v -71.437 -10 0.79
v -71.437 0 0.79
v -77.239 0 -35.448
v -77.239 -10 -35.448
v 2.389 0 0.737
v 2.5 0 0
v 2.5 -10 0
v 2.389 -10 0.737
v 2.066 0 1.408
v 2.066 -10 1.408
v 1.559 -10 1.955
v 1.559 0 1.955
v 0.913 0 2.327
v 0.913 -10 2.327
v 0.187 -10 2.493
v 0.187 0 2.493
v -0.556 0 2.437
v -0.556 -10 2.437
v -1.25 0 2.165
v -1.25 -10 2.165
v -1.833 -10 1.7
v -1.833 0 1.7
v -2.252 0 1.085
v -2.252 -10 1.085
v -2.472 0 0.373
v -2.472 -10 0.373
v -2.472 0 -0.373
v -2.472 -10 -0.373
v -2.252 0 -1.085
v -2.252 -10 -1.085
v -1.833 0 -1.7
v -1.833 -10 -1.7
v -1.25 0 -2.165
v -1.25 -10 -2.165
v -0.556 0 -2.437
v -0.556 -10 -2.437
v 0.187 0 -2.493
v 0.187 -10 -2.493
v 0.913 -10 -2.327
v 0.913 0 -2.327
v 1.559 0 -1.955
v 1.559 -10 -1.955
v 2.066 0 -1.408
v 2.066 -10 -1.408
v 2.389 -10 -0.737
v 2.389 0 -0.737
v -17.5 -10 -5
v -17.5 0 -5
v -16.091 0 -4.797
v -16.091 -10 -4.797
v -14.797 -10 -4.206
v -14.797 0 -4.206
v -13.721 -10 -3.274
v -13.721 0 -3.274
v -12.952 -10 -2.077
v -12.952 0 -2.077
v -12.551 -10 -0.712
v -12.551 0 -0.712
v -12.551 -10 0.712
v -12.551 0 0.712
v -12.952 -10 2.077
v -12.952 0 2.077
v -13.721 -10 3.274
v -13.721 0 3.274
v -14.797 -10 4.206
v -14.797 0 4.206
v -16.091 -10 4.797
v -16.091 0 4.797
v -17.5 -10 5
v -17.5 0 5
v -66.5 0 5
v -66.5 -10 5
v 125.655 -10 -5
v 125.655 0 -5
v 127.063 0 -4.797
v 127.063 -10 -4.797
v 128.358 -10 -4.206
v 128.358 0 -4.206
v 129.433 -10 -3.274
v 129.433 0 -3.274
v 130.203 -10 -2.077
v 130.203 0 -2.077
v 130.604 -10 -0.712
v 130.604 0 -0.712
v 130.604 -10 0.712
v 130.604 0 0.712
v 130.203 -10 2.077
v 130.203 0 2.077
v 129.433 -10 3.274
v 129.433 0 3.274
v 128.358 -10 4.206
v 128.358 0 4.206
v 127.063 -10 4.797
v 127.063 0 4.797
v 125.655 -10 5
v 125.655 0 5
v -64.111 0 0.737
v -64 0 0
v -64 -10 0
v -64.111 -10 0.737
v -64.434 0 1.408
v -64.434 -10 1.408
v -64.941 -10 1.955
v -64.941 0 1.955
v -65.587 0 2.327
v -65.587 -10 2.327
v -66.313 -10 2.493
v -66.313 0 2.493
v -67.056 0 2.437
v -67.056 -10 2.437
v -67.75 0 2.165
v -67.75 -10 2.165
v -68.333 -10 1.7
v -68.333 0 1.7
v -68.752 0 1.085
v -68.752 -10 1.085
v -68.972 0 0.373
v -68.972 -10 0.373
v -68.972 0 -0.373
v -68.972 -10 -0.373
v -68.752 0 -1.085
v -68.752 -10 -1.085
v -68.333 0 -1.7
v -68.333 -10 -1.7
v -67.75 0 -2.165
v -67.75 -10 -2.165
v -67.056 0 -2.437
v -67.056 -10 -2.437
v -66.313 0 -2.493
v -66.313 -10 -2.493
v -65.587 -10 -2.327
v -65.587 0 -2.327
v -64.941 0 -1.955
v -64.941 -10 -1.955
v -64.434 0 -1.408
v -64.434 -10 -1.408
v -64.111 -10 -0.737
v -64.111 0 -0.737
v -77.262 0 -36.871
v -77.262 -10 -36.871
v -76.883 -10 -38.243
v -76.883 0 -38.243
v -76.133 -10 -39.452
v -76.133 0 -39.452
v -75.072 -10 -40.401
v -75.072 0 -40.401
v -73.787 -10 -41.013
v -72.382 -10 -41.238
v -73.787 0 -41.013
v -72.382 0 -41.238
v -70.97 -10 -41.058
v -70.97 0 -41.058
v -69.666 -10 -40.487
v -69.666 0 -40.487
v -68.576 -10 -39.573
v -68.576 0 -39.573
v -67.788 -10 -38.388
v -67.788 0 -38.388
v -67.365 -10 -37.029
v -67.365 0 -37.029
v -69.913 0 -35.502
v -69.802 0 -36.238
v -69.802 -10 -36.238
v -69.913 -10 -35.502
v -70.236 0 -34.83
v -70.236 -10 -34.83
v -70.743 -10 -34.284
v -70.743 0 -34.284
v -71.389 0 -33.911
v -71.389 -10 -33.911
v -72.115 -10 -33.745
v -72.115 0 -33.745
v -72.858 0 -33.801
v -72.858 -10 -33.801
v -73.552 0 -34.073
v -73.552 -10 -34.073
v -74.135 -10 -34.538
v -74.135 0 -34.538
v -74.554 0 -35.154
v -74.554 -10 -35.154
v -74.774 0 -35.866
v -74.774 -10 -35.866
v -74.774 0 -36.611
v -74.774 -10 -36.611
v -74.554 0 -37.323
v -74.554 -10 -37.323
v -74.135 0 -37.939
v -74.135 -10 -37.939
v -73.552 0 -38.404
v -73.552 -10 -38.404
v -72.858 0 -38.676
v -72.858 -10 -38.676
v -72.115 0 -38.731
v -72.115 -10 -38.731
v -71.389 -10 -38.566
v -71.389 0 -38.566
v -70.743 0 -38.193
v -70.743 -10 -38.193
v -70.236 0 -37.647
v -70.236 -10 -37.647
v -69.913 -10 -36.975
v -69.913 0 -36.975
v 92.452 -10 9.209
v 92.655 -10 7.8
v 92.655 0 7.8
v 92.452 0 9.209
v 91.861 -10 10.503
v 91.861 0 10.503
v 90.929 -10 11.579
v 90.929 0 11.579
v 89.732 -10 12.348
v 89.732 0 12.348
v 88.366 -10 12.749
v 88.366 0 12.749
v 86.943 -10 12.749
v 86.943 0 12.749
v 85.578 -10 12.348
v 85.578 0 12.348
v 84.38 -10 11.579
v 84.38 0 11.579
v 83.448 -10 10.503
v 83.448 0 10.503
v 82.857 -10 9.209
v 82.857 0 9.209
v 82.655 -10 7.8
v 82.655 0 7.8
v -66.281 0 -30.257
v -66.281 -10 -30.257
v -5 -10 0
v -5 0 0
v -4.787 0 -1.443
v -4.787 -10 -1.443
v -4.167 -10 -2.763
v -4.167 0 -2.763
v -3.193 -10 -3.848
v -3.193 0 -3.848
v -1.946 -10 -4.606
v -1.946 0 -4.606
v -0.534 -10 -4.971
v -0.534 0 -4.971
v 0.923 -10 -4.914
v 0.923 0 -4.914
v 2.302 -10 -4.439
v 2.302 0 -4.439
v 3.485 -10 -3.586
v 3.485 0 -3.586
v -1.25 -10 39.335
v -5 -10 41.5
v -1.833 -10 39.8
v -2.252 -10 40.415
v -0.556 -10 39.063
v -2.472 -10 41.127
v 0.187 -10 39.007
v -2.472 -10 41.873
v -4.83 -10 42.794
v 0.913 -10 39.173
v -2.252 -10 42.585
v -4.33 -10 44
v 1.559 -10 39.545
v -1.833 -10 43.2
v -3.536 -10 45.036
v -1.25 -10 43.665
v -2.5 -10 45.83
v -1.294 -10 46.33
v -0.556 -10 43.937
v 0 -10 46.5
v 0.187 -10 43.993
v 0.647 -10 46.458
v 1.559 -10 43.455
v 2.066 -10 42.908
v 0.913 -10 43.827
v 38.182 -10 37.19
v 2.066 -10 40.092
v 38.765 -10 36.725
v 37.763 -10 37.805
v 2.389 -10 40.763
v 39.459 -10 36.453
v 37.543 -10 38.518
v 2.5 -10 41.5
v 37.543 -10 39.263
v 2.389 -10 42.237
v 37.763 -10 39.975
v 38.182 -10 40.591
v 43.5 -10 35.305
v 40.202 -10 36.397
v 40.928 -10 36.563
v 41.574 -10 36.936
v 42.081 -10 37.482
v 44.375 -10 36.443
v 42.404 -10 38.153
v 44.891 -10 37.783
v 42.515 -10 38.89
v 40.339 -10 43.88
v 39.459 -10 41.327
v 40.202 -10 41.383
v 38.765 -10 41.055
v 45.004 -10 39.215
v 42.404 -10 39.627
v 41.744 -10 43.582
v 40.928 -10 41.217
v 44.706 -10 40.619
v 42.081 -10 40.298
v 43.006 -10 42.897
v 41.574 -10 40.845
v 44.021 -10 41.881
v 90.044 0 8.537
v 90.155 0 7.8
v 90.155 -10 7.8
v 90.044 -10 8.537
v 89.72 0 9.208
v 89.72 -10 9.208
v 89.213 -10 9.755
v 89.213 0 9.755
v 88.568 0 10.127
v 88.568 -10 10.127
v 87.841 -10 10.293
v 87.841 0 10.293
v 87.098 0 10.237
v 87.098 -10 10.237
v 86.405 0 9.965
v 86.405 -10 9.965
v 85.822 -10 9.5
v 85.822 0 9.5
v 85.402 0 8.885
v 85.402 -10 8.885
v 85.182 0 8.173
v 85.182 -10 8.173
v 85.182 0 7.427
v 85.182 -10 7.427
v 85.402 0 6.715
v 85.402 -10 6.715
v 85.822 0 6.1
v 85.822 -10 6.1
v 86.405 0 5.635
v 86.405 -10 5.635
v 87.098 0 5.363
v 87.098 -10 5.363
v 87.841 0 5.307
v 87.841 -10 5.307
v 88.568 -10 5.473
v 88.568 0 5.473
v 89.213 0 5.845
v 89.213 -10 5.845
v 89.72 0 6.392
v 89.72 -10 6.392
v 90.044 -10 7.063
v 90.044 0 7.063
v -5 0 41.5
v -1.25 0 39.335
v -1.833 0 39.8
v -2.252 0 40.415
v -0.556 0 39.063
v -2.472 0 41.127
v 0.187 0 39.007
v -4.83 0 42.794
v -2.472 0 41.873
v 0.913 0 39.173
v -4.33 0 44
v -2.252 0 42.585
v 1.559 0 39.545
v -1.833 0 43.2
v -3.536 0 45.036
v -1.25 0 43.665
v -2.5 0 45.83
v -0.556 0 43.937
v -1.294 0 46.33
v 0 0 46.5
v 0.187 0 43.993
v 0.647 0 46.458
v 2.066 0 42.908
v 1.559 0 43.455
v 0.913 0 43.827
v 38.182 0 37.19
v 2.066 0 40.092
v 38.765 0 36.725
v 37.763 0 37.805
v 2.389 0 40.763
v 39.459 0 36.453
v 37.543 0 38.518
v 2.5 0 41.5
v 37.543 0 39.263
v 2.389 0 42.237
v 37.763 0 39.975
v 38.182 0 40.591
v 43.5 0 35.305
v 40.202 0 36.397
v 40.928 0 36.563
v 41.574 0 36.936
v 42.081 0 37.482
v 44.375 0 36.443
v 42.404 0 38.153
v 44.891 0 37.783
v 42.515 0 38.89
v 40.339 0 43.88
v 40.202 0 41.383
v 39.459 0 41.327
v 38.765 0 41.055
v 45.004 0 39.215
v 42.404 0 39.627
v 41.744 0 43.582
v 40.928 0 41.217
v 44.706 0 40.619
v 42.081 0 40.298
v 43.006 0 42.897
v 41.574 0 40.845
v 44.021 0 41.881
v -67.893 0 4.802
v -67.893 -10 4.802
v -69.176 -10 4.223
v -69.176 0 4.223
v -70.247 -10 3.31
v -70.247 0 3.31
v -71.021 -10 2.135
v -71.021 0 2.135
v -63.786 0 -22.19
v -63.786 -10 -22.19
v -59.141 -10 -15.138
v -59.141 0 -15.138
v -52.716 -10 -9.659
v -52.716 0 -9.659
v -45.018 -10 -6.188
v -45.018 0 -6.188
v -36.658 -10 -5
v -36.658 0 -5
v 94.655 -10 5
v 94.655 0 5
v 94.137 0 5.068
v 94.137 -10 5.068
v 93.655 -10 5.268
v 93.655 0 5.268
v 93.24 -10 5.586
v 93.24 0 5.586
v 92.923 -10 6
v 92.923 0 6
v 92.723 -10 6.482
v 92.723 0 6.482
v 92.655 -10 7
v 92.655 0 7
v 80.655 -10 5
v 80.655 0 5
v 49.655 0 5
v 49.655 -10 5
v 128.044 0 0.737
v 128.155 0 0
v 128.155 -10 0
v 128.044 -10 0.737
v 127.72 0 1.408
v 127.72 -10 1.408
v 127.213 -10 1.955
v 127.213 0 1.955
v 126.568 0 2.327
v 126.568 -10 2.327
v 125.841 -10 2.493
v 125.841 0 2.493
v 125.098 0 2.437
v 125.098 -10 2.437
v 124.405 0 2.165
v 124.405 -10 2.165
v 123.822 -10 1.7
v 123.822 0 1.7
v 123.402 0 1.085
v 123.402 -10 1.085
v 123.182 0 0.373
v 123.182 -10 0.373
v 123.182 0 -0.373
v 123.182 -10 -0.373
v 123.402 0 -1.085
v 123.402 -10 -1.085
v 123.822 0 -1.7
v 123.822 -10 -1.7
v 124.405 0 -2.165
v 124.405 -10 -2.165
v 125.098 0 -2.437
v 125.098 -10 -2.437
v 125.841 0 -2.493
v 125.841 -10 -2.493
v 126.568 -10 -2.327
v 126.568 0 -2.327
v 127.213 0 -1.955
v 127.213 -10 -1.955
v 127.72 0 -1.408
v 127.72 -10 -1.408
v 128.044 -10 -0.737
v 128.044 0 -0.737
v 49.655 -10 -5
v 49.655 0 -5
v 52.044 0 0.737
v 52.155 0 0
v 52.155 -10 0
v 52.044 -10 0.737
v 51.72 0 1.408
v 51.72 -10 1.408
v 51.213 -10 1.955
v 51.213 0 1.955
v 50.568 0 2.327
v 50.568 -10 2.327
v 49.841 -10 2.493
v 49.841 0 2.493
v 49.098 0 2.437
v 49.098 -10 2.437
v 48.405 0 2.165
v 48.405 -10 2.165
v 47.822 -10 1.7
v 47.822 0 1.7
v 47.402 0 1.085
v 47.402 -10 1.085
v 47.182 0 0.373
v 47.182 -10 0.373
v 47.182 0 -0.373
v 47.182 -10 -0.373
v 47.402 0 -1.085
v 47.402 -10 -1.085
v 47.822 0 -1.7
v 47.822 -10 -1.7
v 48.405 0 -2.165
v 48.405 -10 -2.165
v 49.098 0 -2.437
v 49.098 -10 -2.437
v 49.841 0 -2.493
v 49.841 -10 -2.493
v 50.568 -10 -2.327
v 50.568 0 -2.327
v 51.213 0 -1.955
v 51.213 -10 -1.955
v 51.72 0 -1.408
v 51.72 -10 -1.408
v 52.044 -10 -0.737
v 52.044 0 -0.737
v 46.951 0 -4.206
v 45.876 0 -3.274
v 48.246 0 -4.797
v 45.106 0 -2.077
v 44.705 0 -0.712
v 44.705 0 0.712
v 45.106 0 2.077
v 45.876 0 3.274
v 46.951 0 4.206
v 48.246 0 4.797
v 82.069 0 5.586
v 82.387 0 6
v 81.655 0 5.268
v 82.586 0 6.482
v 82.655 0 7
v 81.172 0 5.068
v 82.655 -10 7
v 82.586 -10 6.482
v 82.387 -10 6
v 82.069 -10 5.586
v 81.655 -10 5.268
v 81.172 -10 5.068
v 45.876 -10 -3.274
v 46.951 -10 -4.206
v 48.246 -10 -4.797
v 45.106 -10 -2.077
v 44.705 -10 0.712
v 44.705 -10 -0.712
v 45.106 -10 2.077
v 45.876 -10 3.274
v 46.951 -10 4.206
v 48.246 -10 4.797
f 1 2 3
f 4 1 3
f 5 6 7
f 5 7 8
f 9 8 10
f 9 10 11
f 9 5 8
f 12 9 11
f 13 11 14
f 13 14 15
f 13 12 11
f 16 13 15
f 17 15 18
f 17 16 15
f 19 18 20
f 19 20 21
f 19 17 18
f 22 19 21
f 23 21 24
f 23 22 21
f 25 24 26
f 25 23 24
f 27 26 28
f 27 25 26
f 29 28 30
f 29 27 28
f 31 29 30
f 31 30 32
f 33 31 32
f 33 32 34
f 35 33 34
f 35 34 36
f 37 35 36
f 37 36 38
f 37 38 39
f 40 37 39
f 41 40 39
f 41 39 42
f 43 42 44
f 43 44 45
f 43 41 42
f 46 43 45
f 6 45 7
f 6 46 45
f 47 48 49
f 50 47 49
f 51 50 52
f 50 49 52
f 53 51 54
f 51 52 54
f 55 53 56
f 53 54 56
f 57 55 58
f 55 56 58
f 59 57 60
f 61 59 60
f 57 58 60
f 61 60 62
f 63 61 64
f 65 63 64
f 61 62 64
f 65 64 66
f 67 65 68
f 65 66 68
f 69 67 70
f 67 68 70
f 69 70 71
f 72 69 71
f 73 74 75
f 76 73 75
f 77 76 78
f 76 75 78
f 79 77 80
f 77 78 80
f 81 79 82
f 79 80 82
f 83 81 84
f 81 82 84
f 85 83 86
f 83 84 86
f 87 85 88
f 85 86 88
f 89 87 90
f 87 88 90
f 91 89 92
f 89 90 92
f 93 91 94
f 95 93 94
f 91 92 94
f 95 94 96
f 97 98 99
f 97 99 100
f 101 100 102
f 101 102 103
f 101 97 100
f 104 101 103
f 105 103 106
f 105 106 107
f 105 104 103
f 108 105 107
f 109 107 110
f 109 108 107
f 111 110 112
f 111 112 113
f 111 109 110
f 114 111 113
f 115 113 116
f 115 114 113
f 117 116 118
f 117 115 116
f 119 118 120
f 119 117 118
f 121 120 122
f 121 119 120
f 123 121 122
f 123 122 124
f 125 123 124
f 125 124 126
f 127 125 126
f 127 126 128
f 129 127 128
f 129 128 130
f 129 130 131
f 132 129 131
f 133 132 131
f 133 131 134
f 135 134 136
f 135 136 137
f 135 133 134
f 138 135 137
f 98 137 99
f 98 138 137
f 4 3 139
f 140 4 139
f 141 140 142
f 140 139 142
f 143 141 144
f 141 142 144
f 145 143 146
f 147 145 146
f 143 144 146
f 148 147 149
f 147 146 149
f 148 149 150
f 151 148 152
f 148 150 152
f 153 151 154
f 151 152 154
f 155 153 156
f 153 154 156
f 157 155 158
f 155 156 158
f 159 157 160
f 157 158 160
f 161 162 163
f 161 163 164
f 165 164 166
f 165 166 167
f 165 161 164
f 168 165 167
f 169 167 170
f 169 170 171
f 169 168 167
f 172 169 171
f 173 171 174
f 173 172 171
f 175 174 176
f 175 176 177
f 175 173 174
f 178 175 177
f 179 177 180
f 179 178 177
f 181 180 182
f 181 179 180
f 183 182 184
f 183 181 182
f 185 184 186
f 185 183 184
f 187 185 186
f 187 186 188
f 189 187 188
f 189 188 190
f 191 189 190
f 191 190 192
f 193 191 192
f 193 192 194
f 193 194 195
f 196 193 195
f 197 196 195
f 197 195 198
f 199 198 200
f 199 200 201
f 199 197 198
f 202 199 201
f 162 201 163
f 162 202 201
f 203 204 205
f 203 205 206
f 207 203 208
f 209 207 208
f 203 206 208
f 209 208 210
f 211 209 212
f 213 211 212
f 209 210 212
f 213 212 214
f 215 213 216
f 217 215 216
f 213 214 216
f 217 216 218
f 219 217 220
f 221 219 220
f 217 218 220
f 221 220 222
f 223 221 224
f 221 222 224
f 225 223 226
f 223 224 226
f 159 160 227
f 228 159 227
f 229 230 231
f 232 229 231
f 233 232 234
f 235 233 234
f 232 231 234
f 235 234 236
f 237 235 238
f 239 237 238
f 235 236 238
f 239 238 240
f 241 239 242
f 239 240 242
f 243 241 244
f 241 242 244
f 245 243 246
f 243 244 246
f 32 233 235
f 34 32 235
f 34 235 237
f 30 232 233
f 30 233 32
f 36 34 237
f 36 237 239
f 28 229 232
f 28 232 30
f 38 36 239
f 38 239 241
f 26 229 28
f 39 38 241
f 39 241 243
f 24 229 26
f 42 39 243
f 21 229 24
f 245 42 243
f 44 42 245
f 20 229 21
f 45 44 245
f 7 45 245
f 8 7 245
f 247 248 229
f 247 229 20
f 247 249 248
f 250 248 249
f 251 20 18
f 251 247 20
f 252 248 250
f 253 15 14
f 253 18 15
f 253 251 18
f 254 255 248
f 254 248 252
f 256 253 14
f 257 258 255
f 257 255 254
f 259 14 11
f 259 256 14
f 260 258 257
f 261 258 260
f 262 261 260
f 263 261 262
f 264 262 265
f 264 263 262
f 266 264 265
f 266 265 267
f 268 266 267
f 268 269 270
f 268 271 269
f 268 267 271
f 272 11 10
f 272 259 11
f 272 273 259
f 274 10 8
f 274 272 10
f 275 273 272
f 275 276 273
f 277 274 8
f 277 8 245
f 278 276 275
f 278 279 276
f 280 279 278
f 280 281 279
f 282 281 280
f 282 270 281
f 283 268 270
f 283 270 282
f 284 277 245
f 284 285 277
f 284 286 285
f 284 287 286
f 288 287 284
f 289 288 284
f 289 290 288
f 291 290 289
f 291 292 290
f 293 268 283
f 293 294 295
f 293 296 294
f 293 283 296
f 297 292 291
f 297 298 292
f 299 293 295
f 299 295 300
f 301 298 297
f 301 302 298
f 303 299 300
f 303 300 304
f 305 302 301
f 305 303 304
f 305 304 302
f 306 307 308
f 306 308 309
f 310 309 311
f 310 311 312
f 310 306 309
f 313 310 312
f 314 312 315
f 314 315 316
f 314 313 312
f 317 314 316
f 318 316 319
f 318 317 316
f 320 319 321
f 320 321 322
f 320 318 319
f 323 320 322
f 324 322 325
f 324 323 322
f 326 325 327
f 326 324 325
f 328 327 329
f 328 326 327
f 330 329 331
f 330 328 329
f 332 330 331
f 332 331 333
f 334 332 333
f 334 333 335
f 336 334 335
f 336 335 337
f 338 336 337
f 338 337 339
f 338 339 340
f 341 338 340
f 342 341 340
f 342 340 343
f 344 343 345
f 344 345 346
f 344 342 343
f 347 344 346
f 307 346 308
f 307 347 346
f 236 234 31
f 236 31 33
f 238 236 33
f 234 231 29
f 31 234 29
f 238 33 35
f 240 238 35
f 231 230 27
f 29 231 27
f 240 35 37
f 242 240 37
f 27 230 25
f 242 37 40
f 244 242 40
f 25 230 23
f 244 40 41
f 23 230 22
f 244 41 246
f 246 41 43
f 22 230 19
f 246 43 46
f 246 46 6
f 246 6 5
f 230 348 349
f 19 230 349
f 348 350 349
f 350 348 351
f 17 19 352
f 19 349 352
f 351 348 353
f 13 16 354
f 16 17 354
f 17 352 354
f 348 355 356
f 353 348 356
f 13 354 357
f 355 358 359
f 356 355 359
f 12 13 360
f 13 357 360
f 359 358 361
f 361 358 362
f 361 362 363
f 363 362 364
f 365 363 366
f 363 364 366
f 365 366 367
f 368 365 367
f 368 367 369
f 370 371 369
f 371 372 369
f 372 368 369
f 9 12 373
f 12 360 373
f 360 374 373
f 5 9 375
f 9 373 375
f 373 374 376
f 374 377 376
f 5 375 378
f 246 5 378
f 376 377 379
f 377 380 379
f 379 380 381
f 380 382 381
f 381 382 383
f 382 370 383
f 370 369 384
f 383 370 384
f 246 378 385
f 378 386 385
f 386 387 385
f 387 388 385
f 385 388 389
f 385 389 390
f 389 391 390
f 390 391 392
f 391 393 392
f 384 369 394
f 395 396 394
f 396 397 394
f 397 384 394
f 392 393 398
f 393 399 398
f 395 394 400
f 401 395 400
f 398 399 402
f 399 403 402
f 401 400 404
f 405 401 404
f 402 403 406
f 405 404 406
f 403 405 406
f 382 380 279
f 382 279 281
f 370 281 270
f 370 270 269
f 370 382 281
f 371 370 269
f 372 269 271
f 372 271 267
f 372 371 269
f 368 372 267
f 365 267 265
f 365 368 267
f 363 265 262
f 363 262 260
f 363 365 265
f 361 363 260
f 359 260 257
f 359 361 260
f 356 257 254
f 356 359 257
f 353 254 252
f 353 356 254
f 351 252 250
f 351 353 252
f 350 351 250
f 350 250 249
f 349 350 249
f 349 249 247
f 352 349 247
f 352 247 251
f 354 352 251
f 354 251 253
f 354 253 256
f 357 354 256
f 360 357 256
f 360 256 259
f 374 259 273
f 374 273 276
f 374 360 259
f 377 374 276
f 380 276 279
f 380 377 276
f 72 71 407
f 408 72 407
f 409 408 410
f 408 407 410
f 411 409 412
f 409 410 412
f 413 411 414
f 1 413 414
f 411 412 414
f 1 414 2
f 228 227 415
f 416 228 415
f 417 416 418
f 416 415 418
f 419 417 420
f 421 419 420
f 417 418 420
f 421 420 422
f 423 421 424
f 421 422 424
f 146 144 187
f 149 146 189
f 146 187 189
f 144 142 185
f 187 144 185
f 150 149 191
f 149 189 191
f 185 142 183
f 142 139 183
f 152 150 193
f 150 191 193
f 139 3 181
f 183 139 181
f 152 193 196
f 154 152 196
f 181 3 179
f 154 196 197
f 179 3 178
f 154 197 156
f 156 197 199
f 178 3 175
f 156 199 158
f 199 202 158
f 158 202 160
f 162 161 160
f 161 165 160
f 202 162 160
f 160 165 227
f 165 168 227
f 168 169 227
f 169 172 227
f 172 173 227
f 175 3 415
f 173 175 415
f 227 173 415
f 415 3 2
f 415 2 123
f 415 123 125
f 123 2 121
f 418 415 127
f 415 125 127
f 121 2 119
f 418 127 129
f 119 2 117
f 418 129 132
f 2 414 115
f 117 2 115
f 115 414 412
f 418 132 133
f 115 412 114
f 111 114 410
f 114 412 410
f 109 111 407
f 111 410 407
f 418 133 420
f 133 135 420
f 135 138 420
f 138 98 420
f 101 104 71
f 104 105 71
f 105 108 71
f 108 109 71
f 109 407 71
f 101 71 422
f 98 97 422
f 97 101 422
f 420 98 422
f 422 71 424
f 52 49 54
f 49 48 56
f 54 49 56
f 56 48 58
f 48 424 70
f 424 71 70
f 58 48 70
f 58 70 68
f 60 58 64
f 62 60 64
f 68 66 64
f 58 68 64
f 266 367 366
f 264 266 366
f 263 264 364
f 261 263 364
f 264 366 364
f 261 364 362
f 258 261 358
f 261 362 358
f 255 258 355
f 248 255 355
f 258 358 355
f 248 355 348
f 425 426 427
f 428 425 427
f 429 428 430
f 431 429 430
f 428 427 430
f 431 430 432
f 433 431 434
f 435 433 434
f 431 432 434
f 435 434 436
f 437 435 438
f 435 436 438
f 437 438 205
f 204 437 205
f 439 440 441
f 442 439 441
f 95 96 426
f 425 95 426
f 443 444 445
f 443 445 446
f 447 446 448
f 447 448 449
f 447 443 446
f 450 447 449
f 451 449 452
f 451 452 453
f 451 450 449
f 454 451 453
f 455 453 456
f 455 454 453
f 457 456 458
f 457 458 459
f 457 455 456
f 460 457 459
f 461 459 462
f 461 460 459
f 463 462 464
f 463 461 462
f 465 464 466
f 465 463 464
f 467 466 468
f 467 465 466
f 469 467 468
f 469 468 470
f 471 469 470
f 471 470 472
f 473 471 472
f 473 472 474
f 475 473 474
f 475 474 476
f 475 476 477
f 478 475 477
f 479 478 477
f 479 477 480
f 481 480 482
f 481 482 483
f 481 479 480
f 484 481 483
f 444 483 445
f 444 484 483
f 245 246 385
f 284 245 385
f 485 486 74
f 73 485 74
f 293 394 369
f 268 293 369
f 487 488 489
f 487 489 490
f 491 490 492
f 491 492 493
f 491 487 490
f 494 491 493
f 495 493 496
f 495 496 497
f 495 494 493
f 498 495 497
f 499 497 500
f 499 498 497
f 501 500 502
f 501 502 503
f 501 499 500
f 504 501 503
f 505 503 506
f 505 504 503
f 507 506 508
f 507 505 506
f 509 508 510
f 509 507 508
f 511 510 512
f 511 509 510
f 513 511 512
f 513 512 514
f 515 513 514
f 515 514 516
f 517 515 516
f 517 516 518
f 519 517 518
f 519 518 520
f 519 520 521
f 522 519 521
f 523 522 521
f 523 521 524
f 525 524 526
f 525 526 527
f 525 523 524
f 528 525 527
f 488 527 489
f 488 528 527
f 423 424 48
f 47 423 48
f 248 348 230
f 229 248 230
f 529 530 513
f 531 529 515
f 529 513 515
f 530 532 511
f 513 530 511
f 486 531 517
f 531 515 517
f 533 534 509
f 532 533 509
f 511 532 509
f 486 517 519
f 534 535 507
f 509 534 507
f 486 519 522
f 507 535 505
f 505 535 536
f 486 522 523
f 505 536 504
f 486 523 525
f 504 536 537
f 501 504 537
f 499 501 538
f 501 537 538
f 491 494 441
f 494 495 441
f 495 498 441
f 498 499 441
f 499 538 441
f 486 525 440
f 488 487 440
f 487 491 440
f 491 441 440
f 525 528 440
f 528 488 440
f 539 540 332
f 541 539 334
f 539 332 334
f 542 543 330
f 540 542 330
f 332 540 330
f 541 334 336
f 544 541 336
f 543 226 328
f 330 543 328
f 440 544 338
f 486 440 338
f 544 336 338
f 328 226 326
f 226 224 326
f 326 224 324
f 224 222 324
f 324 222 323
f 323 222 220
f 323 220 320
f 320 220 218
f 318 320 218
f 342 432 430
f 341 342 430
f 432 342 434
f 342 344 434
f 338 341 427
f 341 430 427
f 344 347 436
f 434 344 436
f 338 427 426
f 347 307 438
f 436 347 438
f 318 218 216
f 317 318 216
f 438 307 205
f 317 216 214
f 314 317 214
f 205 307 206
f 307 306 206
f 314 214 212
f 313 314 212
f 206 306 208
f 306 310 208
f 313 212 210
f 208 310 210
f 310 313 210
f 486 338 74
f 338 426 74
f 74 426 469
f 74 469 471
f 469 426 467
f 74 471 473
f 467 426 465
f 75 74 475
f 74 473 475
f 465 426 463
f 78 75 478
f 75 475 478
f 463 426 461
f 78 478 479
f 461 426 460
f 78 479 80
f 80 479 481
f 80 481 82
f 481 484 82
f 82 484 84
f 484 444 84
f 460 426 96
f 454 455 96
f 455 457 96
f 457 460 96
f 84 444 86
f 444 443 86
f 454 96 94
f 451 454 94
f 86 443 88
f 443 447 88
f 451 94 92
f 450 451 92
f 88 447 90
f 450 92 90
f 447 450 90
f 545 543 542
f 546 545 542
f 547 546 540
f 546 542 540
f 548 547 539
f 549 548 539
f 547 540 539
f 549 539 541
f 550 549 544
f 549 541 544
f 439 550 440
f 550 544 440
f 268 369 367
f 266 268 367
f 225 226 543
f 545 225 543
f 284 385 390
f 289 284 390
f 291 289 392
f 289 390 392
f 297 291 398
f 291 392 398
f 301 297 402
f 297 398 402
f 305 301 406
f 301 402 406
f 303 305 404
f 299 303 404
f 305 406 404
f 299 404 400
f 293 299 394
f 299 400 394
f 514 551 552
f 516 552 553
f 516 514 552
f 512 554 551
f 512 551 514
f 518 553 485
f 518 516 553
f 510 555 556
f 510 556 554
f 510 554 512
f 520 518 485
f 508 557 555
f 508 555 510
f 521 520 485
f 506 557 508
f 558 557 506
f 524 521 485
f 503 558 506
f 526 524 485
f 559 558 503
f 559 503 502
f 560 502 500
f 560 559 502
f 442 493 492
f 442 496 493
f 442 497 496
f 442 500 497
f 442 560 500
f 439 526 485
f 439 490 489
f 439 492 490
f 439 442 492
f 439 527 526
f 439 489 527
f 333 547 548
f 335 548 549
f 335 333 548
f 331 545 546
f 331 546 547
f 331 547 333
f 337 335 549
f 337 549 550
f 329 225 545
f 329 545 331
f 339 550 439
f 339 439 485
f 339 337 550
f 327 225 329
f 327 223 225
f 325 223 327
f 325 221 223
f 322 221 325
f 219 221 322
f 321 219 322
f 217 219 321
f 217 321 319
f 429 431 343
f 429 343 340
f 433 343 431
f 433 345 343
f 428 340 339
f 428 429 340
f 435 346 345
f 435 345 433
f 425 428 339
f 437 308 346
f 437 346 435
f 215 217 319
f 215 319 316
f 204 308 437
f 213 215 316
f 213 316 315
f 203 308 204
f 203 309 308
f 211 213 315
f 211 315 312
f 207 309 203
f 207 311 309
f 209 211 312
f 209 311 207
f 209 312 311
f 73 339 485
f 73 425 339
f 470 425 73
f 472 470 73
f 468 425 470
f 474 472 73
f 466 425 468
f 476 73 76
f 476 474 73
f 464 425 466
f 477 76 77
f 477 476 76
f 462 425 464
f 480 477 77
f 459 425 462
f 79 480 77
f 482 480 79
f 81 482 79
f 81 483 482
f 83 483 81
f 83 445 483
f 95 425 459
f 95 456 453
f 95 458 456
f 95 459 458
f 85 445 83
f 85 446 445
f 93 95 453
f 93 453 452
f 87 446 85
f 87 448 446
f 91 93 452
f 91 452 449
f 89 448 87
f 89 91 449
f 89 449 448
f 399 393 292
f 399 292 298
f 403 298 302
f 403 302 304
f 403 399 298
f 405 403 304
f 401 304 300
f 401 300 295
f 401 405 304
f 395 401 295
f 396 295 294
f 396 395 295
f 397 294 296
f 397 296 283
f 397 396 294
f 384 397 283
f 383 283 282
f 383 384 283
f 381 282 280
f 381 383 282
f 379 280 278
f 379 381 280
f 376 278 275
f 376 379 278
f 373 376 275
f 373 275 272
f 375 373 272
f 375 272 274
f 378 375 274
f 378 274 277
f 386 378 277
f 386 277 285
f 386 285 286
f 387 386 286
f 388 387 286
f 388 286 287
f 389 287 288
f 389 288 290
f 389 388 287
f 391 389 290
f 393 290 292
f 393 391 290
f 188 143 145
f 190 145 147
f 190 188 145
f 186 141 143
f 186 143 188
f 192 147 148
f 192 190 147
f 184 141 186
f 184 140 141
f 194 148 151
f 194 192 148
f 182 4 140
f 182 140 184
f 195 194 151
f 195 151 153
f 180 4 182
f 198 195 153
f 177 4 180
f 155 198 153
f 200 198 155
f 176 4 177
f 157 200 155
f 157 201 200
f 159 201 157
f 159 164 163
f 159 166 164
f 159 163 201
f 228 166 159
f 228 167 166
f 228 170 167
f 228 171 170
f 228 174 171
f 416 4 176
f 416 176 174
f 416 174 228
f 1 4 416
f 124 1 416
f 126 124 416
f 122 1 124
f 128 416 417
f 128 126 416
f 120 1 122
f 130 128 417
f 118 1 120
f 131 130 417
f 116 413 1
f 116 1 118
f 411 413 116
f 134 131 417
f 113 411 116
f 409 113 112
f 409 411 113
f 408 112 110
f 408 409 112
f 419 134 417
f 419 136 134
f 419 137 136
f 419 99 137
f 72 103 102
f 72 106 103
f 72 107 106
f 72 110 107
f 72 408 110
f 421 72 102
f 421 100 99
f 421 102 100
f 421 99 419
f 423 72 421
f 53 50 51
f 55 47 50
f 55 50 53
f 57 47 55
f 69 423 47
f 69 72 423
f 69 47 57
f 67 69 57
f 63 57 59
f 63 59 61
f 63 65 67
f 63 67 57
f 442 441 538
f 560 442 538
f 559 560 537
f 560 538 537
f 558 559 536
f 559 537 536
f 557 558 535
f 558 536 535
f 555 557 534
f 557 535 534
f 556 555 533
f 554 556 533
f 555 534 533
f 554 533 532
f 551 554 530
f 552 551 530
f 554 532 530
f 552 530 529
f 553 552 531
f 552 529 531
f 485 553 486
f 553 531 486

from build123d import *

# Parameters (mm, degrees)
F0_R     = 2.5
F1_DEPTH = 10
F2_R     = 2.5
F4_DEPTH = 10
F3_R     = 2.5
F5_DEPTH = 10


with BuildPart() as f1:
    # F0 (on Front) → F1 (new body)
    with BuildSketch(Plane.XZ):
        with BuildLine():
            Line((40.339092, 43.879605), (0.646863, 46.45798))
            Line((0.646863, 46.45798), (0, 46.5))
            ThreePointArc((0, 46.5), (-3.535534, 45.035534), (-5, 41.5))
            Line((-5, 41.5), (-5, 0))
            ThreePointArc((-5, 0), (-1.946293, -4.605643), (3.484778, -3.585572))
            Line((3.484778, -3.585572), (43.499757, 35.304549))
            ThreePointArc((43.499757, 35.304549), (44.70644, 40.619338), (40.339092, 43.879605))
        make_face()
        Circle(F0_R, mode=Mode.SUBTRACT)
        with Locations((0, 41.5)):
            Circle(F0_R, mode=Mode.SUBTRACT)
        with Locations((40.014979, 38.89012)):
            Circle(F0_R, mode=Mode.SUBTRACT)
    extrude(amount=F1_DEPTH)


with BuildPart() as f4:
    # F2 (on Front) → F4 (new body)
    with BuildSketch(Plane.XZ):
        with BuildLine():
            Line((-36.657991, -5), (-17.5, -5))
            ThreePointArc((-17.5, -5), (-12.5, 0), (-17.5, 5))
            Line((-17.5, 5), (-66.5, 5))
            ThreePointArc((-66.5, 5), (-69.744045, 3.804756), (-71.437121, 0.790469))
            Line((-71.437121, 0.790469), (-77.239161, -35.447996))
            ThreePointArc((-77.239161, -35.447996), (-73.09251, -41.175585), (-67.36492, -37.028933))
            Line((-67.36492, -37.028933), (-66.280715, -30.257187))
            ThreePointArc((-66.280715, -30.257187), (-56.122262, -12.171461), (-36.657991, -5))
        make_face()
        with Locations((-72.302041, -36.238465)):
            Circle(F2_R, mode=Mode.SUBTRACT)
        with Locations((-66.5, 0)):
            Circle(F2_R, mode=Mode.SUBTRACT)
    extrude(amount=F4_DEPTH)


with BuildPart() as f5:
    # F3 (on Front) → F5 (new body)
    with BuildSketch(Plane.XZ):
        with BuildLine():
            Line((80.654577, 5), (49.654577, 5))
            ThreePointArc((49.654577, 5), (44.654577, 0), (49.654577, -5))
            Line((49.654577, -5), (87.654577, -5))
            Line((87.654577, -5), (125.654577, -5))
            ThreePointArc((125.654577, -5), (130.654577, 0), (125.654577, 5))
            Line((125.654577, 5), (94.654577, 5))
            ThreePointArc((94.654577, 5), (93.240363, 5.585786), (92.654577, 7))
            Line((92.654577, 7), (92.654577, 7.8))
            ThreePointArc((92.654577, 7.8), (87.654577, 12.8), (82.654577, 7.8))
            Line((82.654577, 7.8), (82.654577, 7))
            ThreePointArc((82.654577, 7), (82.06879, 5.585786), (80.654577, 5))
        make_face()
        with Locations((49.654577, 0)):
            Circle(F3_R, mode=Mode.SUBTRACT)
        with Locations((125.654577, 0)):
            Circle(F3_R, mode=Mode.SUBTRACT)
        with Locations((87.654577, 7.8)):
            Circle(F3_R, mode=Mode.SUBTRACT)
    extrude(amount=F5_DEPTH)


solid = Compound([f1.part, f4.part, f5.part])
